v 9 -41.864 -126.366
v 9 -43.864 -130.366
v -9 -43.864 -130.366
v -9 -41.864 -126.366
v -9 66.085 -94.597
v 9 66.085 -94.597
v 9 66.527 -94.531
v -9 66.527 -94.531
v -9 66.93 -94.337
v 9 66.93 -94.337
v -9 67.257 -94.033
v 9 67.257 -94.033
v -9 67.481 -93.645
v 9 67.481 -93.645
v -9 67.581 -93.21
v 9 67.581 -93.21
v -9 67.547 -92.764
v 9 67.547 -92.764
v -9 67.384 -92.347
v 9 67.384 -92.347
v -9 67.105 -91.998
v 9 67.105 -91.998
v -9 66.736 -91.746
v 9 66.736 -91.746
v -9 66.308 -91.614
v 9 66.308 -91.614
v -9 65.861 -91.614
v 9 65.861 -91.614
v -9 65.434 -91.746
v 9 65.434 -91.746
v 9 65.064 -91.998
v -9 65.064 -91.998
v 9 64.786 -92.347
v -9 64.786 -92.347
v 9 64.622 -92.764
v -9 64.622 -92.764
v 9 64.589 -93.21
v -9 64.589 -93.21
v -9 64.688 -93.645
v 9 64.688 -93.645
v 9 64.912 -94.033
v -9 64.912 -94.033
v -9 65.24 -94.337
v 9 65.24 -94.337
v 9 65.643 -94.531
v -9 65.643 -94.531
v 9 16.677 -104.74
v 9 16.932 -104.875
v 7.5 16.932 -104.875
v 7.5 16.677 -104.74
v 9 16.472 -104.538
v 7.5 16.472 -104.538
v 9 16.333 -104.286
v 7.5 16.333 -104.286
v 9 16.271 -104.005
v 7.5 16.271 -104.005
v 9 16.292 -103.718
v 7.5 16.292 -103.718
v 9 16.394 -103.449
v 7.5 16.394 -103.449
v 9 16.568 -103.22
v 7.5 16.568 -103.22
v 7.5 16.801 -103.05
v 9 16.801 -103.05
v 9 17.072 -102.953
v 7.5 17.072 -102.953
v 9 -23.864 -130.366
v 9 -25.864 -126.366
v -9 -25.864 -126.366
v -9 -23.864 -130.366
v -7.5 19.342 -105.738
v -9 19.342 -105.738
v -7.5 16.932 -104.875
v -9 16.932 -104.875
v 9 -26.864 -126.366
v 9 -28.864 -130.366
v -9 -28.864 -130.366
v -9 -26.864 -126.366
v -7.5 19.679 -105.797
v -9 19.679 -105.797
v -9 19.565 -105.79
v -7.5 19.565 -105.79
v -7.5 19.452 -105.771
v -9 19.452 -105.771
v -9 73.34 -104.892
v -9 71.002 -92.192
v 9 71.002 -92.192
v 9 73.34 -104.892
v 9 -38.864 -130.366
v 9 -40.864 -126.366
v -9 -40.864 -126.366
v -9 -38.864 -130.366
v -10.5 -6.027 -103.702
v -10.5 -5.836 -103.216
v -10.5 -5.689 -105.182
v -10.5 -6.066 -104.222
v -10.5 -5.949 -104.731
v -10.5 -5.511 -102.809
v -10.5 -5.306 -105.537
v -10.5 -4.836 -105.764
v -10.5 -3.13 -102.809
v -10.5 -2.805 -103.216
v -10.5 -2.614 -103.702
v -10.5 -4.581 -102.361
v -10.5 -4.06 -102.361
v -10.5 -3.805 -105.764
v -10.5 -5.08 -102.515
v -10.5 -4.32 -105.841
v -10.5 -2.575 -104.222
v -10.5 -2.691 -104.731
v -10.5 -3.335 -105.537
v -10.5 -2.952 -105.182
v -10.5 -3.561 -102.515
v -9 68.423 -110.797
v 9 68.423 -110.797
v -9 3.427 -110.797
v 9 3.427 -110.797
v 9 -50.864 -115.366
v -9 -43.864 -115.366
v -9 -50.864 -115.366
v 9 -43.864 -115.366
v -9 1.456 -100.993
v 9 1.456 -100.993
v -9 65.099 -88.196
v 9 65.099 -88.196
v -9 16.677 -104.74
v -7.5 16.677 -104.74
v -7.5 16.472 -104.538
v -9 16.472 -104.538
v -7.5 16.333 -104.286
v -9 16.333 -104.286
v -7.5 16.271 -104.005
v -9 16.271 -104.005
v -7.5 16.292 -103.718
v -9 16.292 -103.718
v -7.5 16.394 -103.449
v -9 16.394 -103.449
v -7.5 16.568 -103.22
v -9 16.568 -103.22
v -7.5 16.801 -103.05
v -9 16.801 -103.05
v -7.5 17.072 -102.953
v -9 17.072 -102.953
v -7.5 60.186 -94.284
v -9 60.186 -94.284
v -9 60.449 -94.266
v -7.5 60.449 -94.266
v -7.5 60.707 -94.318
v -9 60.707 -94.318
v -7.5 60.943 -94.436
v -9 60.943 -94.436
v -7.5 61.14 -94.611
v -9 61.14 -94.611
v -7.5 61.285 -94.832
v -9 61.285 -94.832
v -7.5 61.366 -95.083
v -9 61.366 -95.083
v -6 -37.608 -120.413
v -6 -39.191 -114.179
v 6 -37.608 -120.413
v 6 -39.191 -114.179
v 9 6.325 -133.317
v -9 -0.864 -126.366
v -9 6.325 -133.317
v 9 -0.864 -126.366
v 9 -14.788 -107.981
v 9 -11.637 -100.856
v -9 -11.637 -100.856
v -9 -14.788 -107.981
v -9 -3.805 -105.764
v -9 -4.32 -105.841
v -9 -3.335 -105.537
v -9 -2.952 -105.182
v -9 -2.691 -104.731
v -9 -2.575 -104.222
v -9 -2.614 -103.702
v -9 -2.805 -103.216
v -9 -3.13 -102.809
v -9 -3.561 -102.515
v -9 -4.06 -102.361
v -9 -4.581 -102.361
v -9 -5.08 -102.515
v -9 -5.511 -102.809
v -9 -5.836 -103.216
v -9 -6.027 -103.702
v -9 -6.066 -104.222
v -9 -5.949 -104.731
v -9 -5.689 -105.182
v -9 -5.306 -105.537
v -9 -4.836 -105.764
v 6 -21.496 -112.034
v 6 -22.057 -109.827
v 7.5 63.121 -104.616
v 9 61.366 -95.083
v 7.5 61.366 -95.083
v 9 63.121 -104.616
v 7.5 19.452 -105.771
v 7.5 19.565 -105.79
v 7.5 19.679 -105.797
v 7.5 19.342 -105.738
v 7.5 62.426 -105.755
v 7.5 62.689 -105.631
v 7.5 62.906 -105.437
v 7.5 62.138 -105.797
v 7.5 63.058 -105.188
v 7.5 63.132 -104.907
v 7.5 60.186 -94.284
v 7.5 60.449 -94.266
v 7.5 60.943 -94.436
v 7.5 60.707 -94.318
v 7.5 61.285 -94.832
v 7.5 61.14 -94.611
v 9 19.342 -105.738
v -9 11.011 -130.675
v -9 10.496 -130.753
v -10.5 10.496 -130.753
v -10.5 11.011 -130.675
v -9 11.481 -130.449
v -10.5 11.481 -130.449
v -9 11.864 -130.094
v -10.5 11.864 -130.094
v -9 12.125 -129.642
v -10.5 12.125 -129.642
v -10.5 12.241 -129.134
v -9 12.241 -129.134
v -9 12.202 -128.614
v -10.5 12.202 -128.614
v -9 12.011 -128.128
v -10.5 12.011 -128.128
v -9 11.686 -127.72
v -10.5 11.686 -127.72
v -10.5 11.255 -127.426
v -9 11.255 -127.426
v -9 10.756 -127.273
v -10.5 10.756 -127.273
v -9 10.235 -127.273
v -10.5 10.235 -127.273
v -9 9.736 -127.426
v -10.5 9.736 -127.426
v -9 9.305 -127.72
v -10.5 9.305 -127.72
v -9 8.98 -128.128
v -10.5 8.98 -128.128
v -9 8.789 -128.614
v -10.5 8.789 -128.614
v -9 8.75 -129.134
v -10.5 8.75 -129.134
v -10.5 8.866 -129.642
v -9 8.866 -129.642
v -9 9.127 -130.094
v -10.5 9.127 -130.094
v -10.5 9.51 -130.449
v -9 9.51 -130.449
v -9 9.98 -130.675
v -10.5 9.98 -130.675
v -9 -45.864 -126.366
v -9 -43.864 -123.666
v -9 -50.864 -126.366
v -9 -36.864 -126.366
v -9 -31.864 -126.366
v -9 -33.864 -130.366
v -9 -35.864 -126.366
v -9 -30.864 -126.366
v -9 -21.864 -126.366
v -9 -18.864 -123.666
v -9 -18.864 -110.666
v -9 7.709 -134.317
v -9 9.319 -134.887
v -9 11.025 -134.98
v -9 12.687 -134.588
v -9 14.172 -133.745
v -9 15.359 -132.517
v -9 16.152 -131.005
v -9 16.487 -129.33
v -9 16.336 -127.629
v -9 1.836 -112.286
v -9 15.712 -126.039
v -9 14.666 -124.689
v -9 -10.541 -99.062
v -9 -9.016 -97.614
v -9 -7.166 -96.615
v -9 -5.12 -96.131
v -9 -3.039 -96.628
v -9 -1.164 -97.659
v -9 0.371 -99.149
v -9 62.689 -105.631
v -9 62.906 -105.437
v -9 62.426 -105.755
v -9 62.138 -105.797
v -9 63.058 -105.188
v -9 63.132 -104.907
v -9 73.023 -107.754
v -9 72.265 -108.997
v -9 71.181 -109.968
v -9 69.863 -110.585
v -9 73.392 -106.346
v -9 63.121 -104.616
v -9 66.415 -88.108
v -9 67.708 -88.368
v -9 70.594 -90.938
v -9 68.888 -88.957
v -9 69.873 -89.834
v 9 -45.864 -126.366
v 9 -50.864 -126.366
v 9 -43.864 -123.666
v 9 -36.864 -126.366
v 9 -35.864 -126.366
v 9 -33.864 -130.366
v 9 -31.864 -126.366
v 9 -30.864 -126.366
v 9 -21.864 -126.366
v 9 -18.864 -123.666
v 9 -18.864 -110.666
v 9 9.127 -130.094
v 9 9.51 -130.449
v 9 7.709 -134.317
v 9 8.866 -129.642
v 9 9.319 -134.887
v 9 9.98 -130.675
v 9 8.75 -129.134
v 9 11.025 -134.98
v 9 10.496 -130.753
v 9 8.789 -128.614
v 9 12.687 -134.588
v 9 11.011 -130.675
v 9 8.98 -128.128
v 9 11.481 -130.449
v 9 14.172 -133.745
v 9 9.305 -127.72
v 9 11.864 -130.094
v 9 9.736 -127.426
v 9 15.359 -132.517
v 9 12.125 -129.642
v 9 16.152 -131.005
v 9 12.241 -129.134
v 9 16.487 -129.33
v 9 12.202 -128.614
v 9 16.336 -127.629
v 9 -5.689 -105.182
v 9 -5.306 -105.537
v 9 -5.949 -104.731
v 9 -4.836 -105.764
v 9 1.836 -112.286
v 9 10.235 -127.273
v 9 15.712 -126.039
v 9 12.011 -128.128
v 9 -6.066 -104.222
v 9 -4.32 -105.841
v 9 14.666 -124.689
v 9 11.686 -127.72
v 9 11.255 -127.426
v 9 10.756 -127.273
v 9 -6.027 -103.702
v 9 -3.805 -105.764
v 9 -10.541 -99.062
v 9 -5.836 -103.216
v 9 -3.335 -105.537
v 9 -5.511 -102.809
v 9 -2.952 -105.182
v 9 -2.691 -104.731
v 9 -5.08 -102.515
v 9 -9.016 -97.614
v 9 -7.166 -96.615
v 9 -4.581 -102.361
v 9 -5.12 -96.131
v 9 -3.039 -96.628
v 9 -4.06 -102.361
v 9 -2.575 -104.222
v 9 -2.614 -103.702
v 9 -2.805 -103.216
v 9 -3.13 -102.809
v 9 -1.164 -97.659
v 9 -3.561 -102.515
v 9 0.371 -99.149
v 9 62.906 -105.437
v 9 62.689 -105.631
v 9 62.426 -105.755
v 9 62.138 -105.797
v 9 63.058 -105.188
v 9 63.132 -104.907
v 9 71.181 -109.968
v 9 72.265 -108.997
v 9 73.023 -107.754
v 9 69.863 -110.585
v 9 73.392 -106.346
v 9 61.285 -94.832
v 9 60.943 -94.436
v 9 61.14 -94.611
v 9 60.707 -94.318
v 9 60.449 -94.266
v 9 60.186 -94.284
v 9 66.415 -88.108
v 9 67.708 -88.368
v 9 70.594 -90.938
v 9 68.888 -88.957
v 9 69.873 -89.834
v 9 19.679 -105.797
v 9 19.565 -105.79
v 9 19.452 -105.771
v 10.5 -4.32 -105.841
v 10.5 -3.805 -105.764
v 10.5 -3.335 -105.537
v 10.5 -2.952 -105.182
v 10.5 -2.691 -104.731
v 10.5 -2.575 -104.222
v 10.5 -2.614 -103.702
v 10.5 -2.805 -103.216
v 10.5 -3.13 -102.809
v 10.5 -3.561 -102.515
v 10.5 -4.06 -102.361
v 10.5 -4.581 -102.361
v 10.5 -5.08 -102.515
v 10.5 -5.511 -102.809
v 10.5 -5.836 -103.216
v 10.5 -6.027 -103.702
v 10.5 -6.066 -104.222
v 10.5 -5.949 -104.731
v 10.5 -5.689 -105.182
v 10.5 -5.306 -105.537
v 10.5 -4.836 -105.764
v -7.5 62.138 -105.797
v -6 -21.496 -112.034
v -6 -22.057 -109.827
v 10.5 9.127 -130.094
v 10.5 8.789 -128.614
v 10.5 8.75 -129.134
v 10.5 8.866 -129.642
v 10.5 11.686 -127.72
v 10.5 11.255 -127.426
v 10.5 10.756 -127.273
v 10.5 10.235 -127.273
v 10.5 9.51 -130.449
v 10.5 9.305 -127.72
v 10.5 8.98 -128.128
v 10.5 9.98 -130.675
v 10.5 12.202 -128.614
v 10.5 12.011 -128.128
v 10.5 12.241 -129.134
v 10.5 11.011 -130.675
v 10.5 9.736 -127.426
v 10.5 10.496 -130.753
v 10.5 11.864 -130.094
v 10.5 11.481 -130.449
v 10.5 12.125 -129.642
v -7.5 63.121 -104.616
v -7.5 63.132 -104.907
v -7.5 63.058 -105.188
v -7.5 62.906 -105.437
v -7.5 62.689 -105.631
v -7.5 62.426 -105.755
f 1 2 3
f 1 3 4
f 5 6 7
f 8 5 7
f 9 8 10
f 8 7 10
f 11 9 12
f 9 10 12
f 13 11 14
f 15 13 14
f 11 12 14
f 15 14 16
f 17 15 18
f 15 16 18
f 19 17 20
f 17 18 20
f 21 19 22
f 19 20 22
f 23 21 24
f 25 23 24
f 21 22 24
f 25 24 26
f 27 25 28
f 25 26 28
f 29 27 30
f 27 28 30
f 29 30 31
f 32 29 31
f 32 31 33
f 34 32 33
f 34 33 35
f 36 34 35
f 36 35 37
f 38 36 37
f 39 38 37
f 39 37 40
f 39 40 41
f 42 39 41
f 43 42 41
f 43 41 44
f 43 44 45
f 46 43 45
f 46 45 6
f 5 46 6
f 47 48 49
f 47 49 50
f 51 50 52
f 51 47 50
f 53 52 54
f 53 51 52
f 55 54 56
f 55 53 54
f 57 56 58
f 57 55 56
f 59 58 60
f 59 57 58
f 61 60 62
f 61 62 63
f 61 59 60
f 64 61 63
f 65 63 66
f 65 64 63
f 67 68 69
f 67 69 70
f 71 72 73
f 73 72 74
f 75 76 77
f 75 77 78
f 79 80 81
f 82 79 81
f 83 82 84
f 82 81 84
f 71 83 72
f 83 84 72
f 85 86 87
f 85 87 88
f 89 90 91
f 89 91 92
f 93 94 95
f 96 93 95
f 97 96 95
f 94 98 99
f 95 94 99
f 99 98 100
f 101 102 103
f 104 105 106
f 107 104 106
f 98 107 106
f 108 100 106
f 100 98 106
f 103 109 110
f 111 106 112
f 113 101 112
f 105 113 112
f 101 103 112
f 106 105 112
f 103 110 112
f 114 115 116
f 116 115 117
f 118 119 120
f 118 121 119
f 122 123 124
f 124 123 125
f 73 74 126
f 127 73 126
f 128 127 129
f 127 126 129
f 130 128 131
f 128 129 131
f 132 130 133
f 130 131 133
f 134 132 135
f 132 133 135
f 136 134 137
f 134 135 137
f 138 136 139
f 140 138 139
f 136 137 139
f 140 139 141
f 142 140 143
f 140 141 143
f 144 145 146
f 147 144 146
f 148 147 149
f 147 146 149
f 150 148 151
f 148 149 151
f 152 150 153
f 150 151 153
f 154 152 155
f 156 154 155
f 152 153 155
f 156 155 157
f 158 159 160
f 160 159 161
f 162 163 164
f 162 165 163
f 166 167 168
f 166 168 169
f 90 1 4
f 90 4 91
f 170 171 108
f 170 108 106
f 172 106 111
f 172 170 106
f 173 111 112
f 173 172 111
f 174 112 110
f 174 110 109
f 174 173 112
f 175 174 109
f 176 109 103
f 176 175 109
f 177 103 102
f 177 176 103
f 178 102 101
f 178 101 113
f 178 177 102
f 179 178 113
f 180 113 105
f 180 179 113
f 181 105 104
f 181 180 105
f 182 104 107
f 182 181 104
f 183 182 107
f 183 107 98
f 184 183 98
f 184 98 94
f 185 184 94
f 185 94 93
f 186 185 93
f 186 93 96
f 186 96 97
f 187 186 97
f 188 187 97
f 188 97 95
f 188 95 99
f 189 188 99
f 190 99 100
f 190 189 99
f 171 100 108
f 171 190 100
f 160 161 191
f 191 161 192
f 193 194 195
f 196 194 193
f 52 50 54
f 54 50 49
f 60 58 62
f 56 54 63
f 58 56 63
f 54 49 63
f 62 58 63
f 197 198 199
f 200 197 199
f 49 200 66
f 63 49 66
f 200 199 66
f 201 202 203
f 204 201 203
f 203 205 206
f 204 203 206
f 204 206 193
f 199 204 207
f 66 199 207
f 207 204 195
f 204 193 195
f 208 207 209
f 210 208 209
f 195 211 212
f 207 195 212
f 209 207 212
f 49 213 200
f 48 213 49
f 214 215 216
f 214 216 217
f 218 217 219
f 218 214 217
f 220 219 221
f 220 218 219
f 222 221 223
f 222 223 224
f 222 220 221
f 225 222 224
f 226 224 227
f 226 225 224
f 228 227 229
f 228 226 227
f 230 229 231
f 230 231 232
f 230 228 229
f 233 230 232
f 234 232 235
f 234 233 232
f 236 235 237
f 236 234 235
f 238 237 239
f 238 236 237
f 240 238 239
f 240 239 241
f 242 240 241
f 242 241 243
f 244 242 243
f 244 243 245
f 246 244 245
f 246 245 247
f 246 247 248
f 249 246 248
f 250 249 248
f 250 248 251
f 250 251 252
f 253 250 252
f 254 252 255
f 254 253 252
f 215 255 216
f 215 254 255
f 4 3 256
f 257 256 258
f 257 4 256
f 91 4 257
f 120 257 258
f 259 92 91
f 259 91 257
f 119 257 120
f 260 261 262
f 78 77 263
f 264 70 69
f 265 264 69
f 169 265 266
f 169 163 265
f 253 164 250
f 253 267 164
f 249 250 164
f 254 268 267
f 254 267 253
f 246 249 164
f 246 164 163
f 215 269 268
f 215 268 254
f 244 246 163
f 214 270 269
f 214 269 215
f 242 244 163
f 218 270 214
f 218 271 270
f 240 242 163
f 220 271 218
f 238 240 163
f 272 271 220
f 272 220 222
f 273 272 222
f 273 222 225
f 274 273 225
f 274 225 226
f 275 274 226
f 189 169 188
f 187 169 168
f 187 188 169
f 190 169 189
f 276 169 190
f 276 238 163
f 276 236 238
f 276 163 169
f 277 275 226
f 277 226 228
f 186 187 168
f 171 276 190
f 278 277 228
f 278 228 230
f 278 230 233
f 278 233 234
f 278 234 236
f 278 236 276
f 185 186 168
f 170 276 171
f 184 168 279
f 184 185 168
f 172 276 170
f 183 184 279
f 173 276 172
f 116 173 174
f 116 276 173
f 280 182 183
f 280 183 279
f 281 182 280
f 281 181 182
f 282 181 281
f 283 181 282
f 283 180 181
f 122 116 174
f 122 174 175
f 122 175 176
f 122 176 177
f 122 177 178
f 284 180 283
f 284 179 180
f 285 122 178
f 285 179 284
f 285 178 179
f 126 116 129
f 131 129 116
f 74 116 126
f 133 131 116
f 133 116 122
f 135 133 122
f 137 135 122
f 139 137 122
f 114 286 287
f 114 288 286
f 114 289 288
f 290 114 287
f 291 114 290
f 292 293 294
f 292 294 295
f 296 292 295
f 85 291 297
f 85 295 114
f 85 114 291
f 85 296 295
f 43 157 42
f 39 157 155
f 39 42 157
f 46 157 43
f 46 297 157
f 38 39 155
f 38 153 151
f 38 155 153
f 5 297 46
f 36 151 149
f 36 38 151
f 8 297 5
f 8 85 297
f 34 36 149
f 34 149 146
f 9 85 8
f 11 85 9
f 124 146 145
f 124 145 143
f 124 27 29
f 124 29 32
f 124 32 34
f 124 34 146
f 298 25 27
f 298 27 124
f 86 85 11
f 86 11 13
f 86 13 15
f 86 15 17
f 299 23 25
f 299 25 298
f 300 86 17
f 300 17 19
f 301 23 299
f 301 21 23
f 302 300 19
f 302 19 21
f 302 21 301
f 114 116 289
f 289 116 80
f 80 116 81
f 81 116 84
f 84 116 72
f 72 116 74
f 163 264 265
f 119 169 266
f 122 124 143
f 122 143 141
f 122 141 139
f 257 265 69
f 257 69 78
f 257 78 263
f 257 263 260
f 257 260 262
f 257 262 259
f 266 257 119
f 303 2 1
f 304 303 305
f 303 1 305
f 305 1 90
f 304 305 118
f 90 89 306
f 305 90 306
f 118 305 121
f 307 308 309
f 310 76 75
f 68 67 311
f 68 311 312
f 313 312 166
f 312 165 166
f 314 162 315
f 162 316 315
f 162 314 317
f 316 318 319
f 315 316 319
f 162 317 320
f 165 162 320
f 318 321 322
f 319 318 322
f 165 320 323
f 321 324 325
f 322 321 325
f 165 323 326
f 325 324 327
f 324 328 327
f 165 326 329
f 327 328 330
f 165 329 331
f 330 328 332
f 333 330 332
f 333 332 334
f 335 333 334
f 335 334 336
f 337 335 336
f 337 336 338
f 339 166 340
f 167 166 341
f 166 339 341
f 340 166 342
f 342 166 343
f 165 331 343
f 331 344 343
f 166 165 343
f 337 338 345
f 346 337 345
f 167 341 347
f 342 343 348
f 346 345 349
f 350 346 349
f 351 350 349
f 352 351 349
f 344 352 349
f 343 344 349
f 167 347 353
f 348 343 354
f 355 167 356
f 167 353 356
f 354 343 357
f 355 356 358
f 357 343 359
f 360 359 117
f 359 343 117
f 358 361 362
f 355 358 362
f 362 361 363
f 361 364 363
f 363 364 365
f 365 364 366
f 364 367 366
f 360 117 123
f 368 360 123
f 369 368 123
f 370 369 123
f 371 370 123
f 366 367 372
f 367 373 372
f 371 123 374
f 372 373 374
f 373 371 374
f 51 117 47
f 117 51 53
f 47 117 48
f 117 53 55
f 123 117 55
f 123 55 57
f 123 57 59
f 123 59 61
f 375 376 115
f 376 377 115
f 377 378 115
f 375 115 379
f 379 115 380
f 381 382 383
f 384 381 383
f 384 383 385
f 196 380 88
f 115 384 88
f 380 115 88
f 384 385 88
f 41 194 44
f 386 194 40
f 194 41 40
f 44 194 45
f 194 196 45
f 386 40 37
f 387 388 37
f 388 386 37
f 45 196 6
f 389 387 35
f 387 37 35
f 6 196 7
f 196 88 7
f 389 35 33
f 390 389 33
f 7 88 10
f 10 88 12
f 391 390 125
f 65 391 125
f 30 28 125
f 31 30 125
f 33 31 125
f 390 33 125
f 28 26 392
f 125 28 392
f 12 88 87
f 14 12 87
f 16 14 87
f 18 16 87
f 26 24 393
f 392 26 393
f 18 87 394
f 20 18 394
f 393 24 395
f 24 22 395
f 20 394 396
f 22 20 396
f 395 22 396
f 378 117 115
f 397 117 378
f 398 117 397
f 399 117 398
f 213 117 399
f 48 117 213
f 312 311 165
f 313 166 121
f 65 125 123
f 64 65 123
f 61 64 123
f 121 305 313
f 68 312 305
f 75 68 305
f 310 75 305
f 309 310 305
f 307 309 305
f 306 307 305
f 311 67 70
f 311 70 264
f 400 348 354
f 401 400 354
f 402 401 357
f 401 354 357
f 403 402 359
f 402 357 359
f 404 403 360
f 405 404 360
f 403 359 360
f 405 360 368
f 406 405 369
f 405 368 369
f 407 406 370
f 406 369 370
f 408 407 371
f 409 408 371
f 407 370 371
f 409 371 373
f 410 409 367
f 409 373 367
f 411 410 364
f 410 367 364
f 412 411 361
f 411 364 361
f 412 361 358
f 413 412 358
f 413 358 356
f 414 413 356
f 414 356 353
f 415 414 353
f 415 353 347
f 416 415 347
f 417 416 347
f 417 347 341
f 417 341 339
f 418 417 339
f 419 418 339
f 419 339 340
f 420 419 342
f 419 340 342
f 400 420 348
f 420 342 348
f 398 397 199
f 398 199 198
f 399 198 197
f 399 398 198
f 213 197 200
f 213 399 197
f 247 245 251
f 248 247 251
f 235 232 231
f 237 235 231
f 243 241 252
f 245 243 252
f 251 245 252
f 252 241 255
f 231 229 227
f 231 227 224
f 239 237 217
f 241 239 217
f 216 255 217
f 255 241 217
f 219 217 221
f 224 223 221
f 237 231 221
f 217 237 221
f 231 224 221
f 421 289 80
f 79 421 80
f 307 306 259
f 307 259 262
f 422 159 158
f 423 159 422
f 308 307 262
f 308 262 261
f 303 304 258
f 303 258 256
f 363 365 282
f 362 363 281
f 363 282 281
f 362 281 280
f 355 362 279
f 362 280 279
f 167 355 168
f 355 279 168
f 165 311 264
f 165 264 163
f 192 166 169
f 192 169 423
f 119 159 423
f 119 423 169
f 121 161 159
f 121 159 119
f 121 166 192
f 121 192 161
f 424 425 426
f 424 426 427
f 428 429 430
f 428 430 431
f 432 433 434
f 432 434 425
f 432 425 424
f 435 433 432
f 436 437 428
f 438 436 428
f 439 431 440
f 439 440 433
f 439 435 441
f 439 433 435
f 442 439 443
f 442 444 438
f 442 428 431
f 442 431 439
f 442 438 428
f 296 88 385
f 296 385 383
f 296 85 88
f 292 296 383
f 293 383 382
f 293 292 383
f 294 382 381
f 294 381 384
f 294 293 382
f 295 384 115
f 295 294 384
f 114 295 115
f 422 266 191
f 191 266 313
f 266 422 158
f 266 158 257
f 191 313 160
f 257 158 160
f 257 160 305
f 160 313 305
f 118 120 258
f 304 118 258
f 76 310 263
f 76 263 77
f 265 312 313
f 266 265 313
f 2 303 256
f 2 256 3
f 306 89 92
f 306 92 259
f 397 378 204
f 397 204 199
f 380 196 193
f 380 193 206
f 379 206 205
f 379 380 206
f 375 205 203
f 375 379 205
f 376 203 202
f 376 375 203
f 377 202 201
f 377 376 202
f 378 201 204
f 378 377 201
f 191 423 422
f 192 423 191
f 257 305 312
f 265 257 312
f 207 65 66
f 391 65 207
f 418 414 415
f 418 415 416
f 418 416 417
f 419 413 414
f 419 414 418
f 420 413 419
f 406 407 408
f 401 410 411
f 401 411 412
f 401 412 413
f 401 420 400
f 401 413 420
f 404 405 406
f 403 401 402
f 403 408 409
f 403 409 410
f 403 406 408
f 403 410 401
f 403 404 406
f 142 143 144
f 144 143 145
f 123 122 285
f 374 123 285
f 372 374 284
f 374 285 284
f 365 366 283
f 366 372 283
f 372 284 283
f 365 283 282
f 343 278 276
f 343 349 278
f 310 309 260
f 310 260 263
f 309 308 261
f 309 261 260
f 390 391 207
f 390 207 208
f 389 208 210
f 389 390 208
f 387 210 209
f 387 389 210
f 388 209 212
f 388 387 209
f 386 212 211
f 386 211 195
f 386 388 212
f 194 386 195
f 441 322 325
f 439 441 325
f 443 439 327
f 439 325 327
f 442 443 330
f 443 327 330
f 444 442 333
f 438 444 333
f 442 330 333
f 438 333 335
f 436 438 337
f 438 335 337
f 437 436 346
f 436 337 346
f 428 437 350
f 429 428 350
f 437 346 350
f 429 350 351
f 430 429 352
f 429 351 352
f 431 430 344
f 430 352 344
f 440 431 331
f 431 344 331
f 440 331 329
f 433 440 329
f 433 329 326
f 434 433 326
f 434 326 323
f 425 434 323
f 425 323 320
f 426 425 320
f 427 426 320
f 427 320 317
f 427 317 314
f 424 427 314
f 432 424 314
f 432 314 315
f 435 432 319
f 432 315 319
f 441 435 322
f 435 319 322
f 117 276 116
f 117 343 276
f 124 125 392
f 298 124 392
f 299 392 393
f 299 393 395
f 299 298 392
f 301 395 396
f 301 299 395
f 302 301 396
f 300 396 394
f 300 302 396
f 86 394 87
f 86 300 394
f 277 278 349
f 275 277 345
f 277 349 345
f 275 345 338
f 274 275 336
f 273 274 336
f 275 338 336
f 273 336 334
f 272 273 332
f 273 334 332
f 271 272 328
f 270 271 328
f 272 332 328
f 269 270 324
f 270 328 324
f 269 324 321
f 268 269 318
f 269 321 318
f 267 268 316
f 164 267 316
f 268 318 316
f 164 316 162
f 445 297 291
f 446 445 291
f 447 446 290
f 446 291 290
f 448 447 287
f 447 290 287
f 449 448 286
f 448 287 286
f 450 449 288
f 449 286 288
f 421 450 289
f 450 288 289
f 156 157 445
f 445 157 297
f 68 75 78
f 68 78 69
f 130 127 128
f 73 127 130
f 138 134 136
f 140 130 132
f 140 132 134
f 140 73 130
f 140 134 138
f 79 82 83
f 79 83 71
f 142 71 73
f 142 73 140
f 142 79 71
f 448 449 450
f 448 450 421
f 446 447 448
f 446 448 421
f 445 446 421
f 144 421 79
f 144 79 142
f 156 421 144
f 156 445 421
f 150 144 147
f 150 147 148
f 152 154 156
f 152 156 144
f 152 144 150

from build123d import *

# Parameters (mm, degrees)
BOSS_EXTRUDE1_DEPTH = 9
CUT_EXTRUDE1_DEPTH  = 25
BOSS_EXTRUDE2_DEPTH = 18
LPATTERN1_COUNT     = 5
LPATTERN1_PITCH     = 5
FILLET2_R           = 8
FILLET3_R           = 5
SKETCH7_R           = 1.5
CUT_EXTRUDE2_DEPTH  = 25
SKETCH8_W           = 12
SKETCH8_H           = 17.678618226
CUT_EXTRUDE4_DEPTH  = 8
SKETCH10_R          = 1.75
BOSS_EXTRUDE3_DEPTH = 1.5
SKETCH11_R          = 1.75
BOSS_EXTRUDE5_DEPTH = 1.5
CUT_EXTRUDE5_DEPTH  = 1.5


with BuildPart() as part:
    # Sketch4 → Boss-Extrude1 (new, symmetric)
    with BuildSketch(Plane(origin=(0, 0, 0), x_dir=(0, 0, -1), z_dir=(1, 0, 0))):
        Polygon((110.796991994, 3.426984131), (100.993233908, 1.455607104), (87.193594717, 70.081913709), (110.796991994, 74.426984131), align=None)
        Polygon((126.36598388, -0.864331166), (133.316653042, 6.325119314), (124.689312466, 14.665922308), (112.285585973, 1.836081711), (110.796991994, 3.426984131), (100.993233908, 1.455607104), (96.091354865, 0.469918591), (96.091354865, -9.530081409), (107.980804376, -14.787551363), (115.36598388, -43.864331166), (115.36598388, -50.864331166), (126.36598388, -50.864331166), align=None)
        with BuildLine():
            Line((133.316653042, 6.325119314), (124.689312466, 14.665922308))
            ThreePointArc((124.689312466, 14.665922308), (133.173384251, 14.809191099), (133.316653042, 6.325119314))
        make_face()
    extrude(amount=BOSS_EXTRUDE1_DEPTH, both=True)

    # Sketch5 → Cut-Extrude1 (cut)
    with BuildSketch(Plane(origin=(9, 0, 0), x_dir=(0, 0, -1), z_dir=(1, 0, 0))):
        Polygon((123.66598388, -43.864331166), (123.66598388, -18.864331166), (110.66598388, -18.864331166), align=None)
    extrude(amount=-CUT_EXTRUDE1_DEPTH, mode=Mode.SUBTRACT)

    # Sketch6 → Boss-Extrude2 (add)
    with BuildSketch(Plane(origin=(9, 0, 0), x_dir=(0, 0, -1), z_dir=(1, 0, 0))):
        Polygon((126.36598388, -43.864331166), (130.36598388, -43.864331166), (126.36598388, -41.864331166), align=None)
        Polygon((126.36598388, -43.864331166), (126.36598388, -45.864331166), (130.36598388, -43.864331166), align=None)
    boss_extrude2 = extrude(amount=-BOSS_EXTRUDE2_DEPTH)

    # LPattern1: Boss-Extrude2 ×5
    with Locations(*[(0, i * LPATTERN1_PITCH, 0) for i in range(1, LPATTERN1_COUNT)]):
        add(boss_extrude2)

    # Fillet2
    # the kernel refuses this fillet: 8 mm, written as the material it takes off along each edge
    with BuildSketch(Plane(origin=(-22.024202742, -9.530081409, -96.091354865), x_dir=(0, -0.4044207656516306, -0.9145730393521061), z_dir=(1, 0, 0))) as fillet2_piece_1:
        with BuildLine():
            CenterArc((FILLET2_R * 0.651210137104, FILLET2_R), FILLET2_R, 203.854834431, 66.145165569)
            Line((-FILLET2_R * 0.263362902248, FILLET2_R * 0.595579234348), (-FILLET2_R * 0.281654363035, FILLET2_R * 0.587490819035))
            Line((-FILLET2_R * 0.281654363035, FILLET2_R * 0.587490819035), (-FILLET2_R * 0.0130242027421, -FILLET2_R * 0.02))
            Line((-FILLET2_R * 0.0130242027421, -FILLET2_R * 0.02), (FILLET2_R * 0.651210137104, -FILLET2_R * 0.02))
            Line((FILLET2_R * 0.651210137104, -FILLET2_R * 0.02), (FILLET2_R * 0.651210137104, 0))
        make_face()
    extrude(amount=44.048405484, mode=Mode.SUBTRACT)
    with BuildSketch(Plane(origin=(-24.975146678, 0.469918591, -96.091354865), x_dir=(0, -1, 0), z_dir=(1, 0, 0))) as fillet2_piece_2:
        with BuildLine():
            CenterArc((6.390058671, 8), FILLET2_R, 202.784433835, 67.215566165)
            Line((-0.985688514, 4.901879043), (-1.133203457, 4.839916624))
            ThreePointArc((-1.133203457, 4.839916624), (-0.649704386, 2.419397489), (-0.156860129, -0.031542032))
            Line((-0.156860129, -0.031542032), (0, -0.16))
            Line((0, -0.16), (6.390058671, -0.16))
            Line((6.390058671, -0.16), (6.390058671, 0))
        make_face()
    extrude(amount=49.950293357, mode=Mode.SUBTRACT)

    # Fillet3
    fillet3_edges = [part.edges().sort_by_distance(p)[0] for p in [
        (0, 70.081913709, -87.193594717),
        (0, 74.426984131, -110.796991994),
    ]]
    fillet(fillet3_edges, radius=FILLET3_R)

    # Sketch7 → Cut-Extrude2 (cut)
    with BuildSketch(Plane(origin=(9, 0, 0), x_dir=(0, 0, -1), z_dir=(1, 0, 0))):
        with Locations((93.097450529, 66.084720863)):
            Circle(SKETCH7_R)
    extrude(amount=-CUT_EXTRUDE2_DEPTH, mode=Mode.SUBTRACT)

    # Sketch8 → Cut-Extrude4 (cut)
    with BuildSketch(Plane(origin=(0, 24.86774856, -97.908798117), x_dir=(1, 0, 0), z_dir=(0, -0.246172650114547, 0.9692259934275292))):
        with Locations((0, -57.253709048)):
            Rectangle(SKETCH8_W, SKETCH8_H)
    extrude(amount=-CUT_EXTRUDE4_DEPTH, mode=Mode.SUBTRACT)

    # Sketch10 → Boss-Extrude3 (add)
    with BuildSketch(Plane(origin=(9, 0, 0), x_dir=(0, 0, -1), z_dir=(1, 0, 0))):
        with Locations((129.002982754, 10.495520811)):
            Circle(SKETCH10_R)
    boss_extrude3 = extrude(amount=BOSS_EXTRUDE3_DEPTH)

    # Sketch11 → Boss-Extrude5 (add)
    with BuildSketch(Plane(origin=(9, 0, 0), x_dir=(0, 0, -1), z_dir=(1, 0, 0))):
        with Locations((104.091354865, -4.320400313)):
            Circle(SKETCH11_R)
    boss_extrude5 = extrude(amount=BOSS_EXTRUDE5_DEPTH)

    # Sketch12 → Cut-Extrude5 (cut)
    with BuildSketch(Plane(origin=(9, 0, 0), x_dir=(0, 0, -1), z_dir=(1, 0, 0))):
        with BuildLine():
            Line((105.796991994, 62.137633614), (105.796991994, 19.67893978))
            ThreePointArc((105.796991994, 19.67893978), (105.782233847, 19.507771757), (105.73839501, 19.341655979))
            Line((105.73839501, 19.341655979), (104.874938008, 16.931635031))
            ThreePointArc((104.874938008, 16.931635031), (103.860802938, 16.271567315), (102.953159184, 17.071781129))
            Line((102.953159184, 17.071781129), (94.283666788, 60.185607156))
            ThreePointArc((94.283666788, 60.185607156), (94.435981087, 60.943382118), (95.082997995, 61.366219745))
            Line((95.082997995, 61.366219745), (104.615947394, 63.121108501))
            ThreePointArc((104.615947394, 63.121108501), (105.43689644, 62.906088102), (105.796991994, 62.137633614))
        make_face()
    cut_extrude5 = extrude(amount=-CUT_EXTRUDE5_DEPTH, mode=Mode.SUBTRACT)

    # Mirror1: Boss-Extrude3, Boss-Extrude5, Cut-Extrude5 across plane
    add(boss_extrude3.mirror(Plane(origin=(0, 0, 0), x_dir=(0, 0, 1), z_dir=(1, 0, 0))))
    add(boss_extrude5.mirror(Plane(origin=(0, 0, 0), x_dir=(0, 0, 1), z_dir=(1, 0, 0))))
    add(cut_extrude5.mirror(Plane(origin=(0, 0, 0), x_dir=(0, 0, 1), z_dir=(1, 0, 0))), mode=Mode.SUBTRACT)


solid = part.part
